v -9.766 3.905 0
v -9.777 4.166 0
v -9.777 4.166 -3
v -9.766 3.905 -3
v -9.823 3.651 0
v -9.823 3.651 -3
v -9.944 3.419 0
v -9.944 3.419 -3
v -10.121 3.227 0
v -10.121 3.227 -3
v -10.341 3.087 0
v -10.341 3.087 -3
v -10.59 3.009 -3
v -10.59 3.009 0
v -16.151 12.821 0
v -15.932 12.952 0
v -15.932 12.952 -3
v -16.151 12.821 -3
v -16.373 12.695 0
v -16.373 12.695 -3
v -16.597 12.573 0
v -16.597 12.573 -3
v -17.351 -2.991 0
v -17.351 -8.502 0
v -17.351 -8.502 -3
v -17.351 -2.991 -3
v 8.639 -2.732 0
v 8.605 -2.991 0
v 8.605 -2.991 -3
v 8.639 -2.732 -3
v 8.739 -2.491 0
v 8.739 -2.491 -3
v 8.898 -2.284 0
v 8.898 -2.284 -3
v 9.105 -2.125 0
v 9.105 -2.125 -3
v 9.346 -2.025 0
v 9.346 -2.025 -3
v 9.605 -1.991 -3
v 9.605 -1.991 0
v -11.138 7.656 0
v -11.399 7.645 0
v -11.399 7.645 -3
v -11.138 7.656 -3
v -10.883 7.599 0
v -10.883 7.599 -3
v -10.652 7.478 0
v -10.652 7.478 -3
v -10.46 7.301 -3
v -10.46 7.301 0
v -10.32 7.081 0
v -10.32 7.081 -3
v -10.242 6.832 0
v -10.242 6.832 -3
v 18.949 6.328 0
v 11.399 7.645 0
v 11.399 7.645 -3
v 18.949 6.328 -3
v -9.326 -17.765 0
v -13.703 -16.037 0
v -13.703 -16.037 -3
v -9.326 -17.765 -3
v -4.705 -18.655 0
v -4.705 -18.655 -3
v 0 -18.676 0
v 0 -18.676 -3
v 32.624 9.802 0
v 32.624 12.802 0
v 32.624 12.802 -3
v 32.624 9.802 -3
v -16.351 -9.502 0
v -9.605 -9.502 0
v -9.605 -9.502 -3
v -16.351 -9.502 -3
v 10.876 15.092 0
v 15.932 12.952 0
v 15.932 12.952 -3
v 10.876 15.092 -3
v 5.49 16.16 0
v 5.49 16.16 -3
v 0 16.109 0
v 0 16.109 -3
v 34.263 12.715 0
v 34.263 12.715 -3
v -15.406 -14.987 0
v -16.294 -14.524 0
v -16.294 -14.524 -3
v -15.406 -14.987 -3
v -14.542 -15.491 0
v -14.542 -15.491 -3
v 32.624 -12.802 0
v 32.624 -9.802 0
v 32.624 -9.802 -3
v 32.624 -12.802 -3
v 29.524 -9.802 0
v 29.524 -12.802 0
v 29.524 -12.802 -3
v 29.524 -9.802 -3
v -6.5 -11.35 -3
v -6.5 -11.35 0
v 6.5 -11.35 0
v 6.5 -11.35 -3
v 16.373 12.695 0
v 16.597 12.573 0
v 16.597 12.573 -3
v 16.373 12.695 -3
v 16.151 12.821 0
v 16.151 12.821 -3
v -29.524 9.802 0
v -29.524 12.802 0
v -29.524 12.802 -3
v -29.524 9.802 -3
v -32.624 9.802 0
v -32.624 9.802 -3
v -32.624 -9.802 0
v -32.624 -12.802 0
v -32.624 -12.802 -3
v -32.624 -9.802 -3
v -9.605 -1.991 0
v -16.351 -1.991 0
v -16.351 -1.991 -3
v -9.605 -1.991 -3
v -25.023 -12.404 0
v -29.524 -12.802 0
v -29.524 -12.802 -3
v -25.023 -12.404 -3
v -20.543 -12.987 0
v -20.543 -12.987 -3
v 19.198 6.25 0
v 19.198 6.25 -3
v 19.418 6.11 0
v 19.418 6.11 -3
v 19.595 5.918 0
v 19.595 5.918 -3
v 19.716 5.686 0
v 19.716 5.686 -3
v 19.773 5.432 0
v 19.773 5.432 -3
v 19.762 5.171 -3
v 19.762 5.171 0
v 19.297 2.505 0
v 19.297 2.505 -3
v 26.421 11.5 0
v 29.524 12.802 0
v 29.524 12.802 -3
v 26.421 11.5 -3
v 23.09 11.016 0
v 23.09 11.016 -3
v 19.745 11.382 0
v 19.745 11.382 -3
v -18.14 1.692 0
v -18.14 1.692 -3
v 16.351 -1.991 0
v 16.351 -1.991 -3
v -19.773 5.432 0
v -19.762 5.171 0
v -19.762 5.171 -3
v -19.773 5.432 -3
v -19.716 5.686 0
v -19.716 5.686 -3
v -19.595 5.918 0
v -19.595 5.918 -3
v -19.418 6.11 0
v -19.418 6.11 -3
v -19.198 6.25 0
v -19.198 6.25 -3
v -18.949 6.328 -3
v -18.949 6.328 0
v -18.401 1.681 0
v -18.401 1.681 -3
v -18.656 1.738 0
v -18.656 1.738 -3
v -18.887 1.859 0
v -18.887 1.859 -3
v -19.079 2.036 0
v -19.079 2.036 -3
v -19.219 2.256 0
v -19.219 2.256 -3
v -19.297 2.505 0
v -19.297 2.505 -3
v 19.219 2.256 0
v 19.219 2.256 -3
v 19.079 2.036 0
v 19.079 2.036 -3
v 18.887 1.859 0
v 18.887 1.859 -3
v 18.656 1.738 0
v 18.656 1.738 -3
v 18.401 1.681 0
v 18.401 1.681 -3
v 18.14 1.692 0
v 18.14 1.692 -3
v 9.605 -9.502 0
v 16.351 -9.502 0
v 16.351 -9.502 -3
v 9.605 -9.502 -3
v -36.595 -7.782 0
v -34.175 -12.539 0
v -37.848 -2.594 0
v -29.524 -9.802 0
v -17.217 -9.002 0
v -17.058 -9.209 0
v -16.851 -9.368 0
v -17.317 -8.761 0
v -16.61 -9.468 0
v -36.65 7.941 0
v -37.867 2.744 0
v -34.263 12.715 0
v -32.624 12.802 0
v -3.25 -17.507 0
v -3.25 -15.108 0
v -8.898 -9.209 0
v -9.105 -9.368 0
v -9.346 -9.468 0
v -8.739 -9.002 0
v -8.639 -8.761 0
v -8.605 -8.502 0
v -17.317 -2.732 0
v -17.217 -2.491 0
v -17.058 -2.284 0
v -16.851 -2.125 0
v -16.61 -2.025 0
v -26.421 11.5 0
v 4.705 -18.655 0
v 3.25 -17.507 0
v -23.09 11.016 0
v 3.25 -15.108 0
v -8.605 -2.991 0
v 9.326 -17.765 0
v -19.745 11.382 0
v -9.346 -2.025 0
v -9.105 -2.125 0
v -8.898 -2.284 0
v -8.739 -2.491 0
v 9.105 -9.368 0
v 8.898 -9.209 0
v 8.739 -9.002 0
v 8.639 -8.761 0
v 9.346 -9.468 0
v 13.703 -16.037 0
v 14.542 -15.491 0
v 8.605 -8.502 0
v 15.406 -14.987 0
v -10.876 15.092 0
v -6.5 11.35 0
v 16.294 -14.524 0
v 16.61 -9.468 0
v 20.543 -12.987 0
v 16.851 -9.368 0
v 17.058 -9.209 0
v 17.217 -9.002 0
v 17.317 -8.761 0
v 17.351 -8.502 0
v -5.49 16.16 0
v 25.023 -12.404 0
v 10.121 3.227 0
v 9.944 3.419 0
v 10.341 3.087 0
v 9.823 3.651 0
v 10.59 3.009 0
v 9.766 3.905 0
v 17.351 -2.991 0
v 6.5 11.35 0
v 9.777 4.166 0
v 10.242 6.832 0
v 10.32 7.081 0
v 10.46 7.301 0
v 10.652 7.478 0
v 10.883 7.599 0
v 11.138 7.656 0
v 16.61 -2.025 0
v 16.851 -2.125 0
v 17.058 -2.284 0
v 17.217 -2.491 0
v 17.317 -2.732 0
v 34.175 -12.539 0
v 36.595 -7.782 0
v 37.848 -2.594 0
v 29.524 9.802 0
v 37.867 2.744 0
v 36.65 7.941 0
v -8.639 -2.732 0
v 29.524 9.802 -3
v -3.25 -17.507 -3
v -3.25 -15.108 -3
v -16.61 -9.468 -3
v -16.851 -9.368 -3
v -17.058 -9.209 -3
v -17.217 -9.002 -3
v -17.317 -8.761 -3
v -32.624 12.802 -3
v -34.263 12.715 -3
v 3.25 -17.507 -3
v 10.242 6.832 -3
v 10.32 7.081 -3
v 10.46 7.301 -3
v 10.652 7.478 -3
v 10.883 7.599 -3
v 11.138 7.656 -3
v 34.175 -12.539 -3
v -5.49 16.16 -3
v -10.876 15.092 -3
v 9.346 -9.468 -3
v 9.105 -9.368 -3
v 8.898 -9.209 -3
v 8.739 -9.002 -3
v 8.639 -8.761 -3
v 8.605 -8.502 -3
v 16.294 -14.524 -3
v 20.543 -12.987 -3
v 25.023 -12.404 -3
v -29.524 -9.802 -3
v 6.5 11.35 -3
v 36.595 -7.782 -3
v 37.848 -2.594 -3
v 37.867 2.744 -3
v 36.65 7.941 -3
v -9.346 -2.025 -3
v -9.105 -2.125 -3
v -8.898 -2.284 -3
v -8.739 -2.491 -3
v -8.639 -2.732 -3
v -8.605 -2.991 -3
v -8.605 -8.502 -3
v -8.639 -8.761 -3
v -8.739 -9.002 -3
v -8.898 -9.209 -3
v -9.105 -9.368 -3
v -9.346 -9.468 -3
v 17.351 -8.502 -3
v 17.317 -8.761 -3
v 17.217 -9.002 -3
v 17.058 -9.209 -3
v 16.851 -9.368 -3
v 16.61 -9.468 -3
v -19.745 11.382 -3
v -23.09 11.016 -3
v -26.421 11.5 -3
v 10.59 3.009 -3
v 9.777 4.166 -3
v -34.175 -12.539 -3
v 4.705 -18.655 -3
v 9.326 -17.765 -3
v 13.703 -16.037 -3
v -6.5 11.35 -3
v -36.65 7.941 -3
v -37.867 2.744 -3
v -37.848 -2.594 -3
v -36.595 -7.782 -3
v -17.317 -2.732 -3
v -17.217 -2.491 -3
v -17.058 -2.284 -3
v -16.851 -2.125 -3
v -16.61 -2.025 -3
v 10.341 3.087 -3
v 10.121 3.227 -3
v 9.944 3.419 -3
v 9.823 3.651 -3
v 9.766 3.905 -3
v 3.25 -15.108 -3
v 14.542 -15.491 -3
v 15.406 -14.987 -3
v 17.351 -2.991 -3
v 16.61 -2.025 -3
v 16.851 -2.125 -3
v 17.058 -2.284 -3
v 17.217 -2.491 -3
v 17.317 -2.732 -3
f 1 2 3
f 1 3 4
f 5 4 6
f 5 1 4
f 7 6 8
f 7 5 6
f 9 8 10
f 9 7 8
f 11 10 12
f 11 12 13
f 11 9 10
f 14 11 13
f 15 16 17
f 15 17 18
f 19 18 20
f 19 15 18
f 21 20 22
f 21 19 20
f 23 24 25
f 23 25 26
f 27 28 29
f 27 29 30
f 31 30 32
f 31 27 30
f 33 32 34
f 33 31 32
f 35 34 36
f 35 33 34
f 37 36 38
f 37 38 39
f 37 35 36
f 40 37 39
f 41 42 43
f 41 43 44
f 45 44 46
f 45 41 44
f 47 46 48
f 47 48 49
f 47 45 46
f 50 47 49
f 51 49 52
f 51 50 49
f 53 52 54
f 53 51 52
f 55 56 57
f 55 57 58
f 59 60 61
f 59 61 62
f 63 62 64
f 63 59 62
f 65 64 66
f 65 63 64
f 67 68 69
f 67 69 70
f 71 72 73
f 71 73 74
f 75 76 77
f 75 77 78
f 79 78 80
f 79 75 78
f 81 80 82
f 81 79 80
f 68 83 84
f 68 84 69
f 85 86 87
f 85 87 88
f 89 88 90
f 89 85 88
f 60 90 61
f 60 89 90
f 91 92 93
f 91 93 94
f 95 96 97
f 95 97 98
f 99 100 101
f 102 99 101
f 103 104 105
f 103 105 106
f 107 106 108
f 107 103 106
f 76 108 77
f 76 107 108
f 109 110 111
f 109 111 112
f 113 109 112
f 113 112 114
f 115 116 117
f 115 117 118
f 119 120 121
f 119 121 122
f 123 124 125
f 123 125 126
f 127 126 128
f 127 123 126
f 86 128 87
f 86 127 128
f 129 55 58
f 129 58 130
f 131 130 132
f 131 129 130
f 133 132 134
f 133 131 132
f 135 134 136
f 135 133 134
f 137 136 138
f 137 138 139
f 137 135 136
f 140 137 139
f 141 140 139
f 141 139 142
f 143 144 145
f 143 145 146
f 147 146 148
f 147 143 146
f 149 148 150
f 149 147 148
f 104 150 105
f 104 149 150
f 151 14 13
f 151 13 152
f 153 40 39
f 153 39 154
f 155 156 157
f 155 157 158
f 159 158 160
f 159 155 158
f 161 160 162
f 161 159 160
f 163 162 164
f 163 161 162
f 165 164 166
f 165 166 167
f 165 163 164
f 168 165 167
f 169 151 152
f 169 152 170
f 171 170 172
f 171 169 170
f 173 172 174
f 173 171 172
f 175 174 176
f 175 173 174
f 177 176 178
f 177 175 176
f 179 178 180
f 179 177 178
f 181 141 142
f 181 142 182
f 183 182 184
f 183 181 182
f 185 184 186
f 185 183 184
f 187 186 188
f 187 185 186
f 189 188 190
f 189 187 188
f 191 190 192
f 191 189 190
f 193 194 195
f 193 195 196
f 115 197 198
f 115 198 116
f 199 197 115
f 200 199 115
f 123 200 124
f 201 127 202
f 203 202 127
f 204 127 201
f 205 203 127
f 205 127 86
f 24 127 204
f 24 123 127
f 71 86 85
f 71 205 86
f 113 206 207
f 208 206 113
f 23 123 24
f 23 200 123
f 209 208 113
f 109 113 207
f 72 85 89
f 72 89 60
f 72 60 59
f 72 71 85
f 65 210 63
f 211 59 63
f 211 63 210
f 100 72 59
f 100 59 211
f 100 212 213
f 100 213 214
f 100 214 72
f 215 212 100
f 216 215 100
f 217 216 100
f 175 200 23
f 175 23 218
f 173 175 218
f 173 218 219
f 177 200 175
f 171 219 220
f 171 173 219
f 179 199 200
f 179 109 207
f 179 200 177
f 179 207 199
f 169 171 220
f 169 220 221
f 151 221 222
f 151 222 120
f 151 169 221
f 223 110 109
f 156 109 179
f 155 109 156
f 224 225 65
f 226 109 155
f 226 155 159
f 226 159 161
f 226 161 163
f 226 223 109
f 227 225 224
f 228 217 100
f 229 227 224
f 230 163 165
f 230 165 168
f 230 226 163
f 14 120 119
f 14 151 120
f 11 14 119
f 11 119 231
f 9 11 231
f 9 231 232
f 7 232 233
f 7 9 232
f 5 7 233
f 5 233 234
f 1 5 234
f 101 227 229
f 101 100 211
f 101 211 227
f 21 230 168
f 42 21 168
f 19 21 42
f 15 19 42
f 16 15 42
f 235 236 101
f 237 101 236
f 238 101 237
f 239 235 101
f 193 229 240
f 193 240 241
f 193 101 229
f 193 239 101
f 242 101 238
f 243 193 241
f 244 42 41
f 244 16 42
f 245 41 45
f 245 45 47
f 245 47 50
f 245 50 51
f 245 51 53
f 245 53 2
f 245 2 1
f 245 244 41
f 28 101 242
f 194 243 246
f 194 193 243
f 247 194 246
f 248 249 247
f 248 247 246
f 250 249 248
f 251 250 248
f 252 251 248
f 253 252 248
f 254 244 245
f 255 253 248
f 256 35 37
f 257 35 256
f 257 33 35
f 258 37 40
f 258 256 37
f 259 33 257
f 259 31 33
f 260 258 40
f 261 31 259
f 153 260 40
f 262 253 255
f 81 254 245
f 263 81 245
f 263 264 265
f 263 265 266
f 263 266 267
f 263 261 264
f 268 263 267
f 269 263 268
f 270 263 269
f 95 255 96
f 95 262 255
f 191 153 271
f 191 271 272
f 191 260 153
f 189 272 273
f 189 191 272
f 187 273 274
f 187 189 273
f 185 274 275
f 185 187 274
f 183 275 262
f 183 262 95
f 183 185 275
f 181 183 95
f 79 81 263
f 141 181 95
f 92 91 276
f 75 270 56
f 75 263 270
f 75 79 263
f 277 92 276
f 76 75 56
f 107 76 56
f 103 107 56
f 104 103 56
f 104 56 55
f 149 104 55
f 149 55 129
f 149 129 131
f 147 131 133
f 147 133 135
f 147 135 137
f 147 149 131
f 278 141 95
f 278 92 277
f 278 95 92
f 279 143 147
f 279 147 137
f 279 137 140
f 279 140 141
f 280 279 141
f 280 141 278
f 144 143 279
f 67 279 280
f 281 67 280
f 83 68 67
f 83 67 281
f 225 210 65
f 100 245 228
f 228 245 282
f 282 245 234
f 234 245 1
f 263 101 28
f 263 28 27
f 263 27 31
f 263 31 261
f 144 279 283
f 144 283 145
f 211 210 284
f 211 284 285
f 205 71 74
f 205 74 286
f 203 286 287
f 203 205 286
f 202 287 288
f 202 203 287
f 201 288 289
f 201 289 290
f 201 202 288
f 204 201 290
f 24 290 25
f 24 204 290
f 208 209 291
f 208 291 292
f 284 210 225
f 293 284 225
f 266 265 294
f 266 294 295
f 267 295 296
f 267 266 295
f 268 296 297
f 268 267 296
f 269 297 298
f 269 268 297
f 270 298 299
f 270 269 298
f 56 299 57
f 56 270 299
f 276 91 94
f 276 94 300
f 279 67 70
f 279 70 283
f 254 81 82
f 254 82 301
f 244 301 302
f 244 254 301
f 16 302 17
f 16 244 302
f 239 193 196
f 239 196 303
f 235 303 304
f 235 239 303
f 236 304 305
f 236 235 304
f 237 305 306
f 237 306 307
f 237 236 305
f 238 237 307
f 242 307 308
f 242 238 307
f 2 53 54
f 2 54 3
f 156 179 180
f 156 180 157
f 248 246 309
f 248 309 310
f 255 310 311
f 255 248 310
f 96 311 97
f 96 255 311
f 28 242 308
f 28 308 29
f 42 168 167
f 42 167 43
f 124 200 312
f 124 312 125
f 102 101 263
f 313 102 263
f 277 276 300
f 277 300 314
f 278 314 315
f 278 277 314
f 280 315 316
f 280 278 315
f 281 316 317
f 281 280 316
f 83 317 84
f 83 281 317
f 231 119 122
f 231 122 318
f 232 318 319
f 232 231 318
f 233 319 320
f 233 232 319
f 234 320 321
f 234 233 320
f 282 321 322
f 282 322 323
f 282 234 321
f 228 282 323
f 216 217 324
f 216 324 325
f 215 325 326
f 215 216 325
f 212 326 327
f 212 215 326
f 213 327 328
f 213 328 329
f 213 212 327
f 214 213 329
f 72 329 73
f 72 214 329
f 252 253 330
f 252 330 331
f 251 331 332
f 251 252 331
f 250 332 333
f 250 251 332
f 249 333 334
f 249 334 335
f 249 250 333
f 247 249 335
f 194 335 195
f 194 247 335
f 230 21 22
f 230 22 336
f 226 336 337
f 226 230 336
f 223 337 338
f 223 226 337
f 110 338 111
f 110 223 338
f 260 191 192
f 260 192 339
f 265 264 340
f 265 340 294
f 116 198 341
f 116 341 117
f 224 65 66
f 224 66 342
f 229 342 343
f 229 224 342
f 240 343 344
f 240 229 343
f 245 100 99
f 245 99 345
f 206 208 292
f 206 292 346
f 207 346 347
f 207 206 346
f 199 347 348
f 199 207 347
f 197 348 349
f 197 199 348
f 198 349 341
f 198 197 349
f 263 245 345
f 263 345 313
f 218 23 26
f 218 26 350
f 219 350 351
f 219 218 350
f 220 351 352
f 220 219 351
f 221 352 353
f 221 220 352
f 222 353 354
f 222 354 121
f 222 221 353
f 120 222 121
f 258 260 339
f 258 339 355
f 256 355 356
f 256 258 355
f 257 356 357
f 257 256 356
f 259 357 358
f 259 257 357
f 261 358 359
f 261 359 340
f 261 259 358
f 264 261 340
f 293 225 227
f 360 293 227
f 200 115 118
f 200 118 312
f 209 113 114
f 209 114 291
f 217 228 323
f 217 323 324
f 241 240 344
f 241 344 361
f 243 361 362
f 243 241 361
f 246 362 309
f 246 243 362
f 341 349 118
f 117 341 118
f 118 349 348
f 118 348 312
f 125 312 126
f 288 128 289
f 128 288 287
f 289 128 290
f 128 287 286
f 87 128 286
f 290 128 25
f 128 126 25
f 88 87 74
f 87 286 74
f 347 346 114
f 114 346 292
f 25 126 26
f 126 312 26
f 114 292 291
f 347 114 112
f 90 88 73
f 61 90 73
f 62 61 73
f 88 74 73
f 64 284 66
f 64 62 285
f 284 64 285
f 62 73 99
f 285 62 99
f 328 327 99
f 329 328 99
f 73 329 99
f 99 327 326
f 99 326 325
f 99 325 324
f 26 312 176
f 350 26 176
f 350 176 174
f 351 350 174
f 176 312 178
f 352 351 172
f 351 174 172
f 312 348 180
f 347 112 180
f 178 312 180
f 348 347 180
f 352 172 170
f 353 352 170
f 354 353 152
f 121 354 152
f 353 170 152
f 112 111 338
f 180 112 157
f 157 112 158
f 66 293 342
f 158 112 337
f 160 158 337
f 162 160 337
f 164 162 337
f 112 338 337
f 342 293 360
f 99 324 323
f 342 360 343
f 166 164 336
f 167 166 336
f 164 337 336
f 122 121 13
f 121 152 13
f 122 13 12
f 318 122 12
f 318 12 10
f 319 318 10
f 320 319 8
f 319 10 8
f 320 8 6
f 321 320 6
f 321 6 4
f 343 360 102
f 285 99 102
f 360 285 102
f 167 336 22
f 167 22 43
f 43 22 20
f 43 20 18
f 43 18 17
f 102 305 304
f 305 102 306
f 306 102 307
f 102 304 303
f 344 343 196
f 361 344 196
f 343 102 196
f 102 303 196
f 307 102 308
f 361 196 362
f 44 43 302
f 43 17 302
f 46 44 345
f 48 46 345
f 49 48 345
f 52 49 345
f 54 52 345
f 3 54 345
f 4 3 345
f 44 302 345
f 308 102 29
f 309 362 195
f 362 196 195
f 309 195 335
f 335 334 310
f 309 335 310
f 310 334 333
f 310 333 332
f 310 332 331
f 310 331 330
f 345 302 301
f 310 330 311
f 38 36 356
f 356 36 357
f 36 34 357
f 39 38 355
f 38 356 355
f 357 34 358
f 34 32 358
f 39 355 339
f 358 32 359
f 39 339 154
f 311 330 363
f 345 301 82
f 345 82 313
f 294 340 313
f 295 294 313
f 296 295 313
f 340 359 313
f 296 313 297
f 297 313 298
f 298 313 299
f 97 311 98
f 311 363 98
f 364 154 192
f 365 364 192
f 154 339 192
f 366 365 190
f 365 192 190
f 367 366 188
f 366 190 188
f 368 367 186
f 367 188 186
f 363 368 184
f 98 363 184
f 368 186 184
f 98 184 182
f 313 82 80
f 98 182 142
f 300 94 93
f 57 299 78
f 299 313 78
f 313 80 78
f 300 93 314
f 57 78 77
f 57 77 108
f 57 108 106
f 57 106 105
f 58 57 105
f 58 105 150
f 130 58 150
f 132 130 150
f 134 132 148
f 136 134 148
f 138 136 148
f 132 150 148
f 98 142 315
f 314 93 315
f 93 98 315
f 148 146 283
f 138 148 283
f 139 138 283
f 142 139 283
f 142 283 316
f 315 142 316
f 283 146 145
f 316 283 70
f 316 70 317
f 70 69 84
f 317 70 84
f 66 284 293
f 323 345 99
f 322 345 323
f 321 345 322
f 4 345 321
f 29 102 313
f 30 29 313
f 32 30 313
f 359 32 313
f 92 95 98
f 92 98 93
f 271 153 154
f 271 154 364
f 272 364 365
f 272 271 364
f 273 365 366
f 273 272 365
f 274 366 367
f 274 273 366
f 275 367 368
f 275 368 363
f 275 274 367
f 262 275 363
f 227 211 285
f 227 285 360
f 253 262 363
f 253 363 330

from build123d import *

# Parameters (mm, degrees)
BOSS_EXTRUDE1_DEPTH = 3
SKETCH2_W           = 13
SKETCH2_H           = 22.7
SKETCH2_W_2         = 6.499
SKETCH2_H_2         = 2.399
CUT_EXTRUDE1_DEPTH  = 3


with BuildPart() as part:
    # Sketch1 → Boss-Extrude1 (new body)
    with BuildSketch(Plane.XY):
        with BuildLine():
            ThreePointArc((-27.048045715, 1.346978667), (-23.229413898, -7.644456097), (-16.294351646, -14.524336884))
            ThreePointArc((-16.294351646, -14.524336884), (-14.971129192, -15.233831637), (-13.702557421, -16.036966825))
            ThreePointArc((-13.702557421, -16.036966825), (-7.036411487, -18.317683791), (0, -18.675573281))
            ThreePointArc((0, -18.675573281), (7.036411487, -18.317683791), (13.702557421, -16.036966825))
            ThreePointArc((13.702557421, -16.036966825), (14.971129192, -15.233831637), (16.294351646, -14.524336884))
            ThreePointArc((16.294351646, -14.524336884), (23.229413898, -7.644456097), (27.048045715, 1.346978667))
            ThreePointArc((27.048045715, 1.346978667), (22.641390956, 7.722324922), (16.597159635, 12.573192245))
            ThreePointArc((16.597159635, 12.573192245), (16.261784348, 12.757647773), (15.931841919, 12.951654004))
            ThreePointArc((15.931841919, 12.951654004), (8.210400332, 15.763932748), (0, 16.108749071))
            ThreePointArc((0, 16.108749071), (-8.210400332, 15.763932748), (-15.931841919, 12.951654004))
            ThreePointArc((-15.931841919, 12.951654004), (-16.261784348, 12.757647773), (-16.597159635, 12.573192245))
            ThreePointArc((-16.597159635, 12.573192245), (-22.641390956, 7.722324922), (-27.048045715, 1.346978667))
        make_face()
        with BuildLine():
            Line((29.524, 9.802), (29.524, -9.802))
            Line((29.524, -9.802), (32.624, -9.802))
            Line((32.624, -9.802), (32.624, -12.802))
            Line((32.624, -12.802), (34.17489845, -12.539239659))
            ThreePointArc((34.17489845, -12.539239659), (38.013587392, 0.074463168), (34.262667869, 12.714543648))
            Line((34.262667869, 12.714543648), (32.624, 12.802))
            Line((32.624, 12.802), (32.624, 9.802))
            Line((32.624, 9.802), (29.524, 9.802))
        make_face()
        with BuildLine():
            ThreePointArc((27.048045715, 1.346978667), (23.229413898, -7.644456097), (16.294351646, -14.524336884))
            ThreePointArc((16.294351646, -14.524336884), (22.767282146, -12.573251909), (29.524, -12.802))
            Line((29.524, -12.802), (29.524, -9.802))
            Line((29.524, -9.802), (29.524, 9.802))
            Line((29.524, 9.802), (29.524, 12.802))
            ThreePointArc((29.524, 12.802), (23.09016911, 11.015904248), (16.597159635, 12.573192245))
            ThreePointArc((16.597159635, 12.573192245), (22.641390956, 7.722324922), (27.048045715, 1.346978667))
        make_face()
        with BuildLine():
            Line((-29.524, -9.802), (-29.524, -12.802))
            ThreePointArc((-29.524, -12.802), (-22.767282146, -12.573251909), (-16.294351646, -14.524336884))
            ThreePointArc((-16.294351646, -14.524336884), (-23.229413898, -7.644456097), (-27.048045715, 1.346978667))
            ThreePointArc((-27.048045715, 1.346978667), (-22.641390956, 7.722324922), (-16.597159635, 12.573192245))
            ThreePointArc((-16.597159635, 12.573192245), (-23.09016911, 11.015904248), (-29.524, 12.802))
            Line((-29.524, 12.802), (-29.524, 9.802))
            Line((-29.524, 9.802), (-29.524, -9.802))
        make_face()
        with BuildLine():
            Line((-32.624, -9.802), (-29.524, -9.802))
            Line((-29.524, -9.802), (-29.524, 9.802))
            Line((-29.524, 9.802), (-32.624, 9.802))
            Line((-32.624, 9.802), (-32.624, 12.802))
            Line((-32.624, 12.802), (-34.262667869, 12.714543648))
            ThreePointArc((-34.262667869, 12.714543648), (-38.013587392, 0.074463168), (-34.17489845, -12.539239659))
            Line((-34.17489845, -12.539239659), (-32.624, -12.802))
            Line((-32.624, -12.802), (-32.624, -9.802))
        make_face()
    extrude(amount=-BOSS_EXTRUDE1_DEPTH)

    # Sketch2 → Cut-Extrude1 (cut)
    with BuildSketch(Plane.XY):
        with BuildLine():
            ThreePointArc((-18.140073475, 1.691900685), (-18.886998155, 1.858903562), (-19.297064795, 2.505147934))
            Line((-19.297064795, 2.505147934), (-19.762150522, 5.170880716))
            ThreePointArc((-19.762150522, 5.170880716), (-19.595147646, 5.917805396), (-18.948903274, 6.327872035))
            Line((-18.948903274, 6.327872035), (-11.398949082, 7.645099315))
            ThreePointArc((-11.398949082, 7.645099315), (-10.652024403, 7.478096438), (-10.241957763, 6.831852066))
            Line((-10.241957763, 6.831852066), (-9.776872035, 4.166119284))
            ThreePointArc((-9.776872035, 4.166119284), (-9.943874912, 3.419194604), (-10.590119284, 3.009127965))
            Line((-10.590119284, 3.009127965), (-18.140073475, 1.691900685))
        make_face()
        Rectangle(SKETCH2_W, SKETCH2_H)
        with BuildLine():
            ThreePointArc((-16.351, -9.502), (-17.058106781, -9.209106781), (-17.351, -8.502))
            Line((-17.351, -8.502), (-17.351, -2.991))
            ThreePointArc((-17.351, -2.991), (-17.058106781, -2.283893219), (-16.351, -1.991))
            Line((-16.351, -1.991), (-9.605, -1.991))
            ThreePointArc((-9.605, -1.991), (-8.897893219, -2.283893219), (-8.605, -2.991))
            Line((-8.605, -2.991), (-8.605, -8.502))
            ThreePointArc((-8.605, -8.502), (-8.897893219, -9.209106781), (-9.605, -9.502))
            Line((-9.605, -9.502), (-16.351, -9.502))
        make_face()
        with BuildLine():
            Line((9.605, -1.991), (16.351, -1.991))
            ThreePointArc((16.351, -1.991), (17.058106781, -2.283893219), (17.351, -2.991))
            Line((17.351, -2.991), (17.351, -8.502))
            ThreePointArc((17.351, -8.502), (17.058106781, -9.209106781), (16.351, -9.502))
            Line((16.351, -9.502), (9.605, -9.502))
            ThreePointArc((9.605, -9.502), (8.897893219, -9.209106781), (8.605, -8.502))
            Line((8.605, -8.502), (8.605, -2.991))
            ThreePointArc((8.605, -2.991), (8.897893219, -2.283893219), (9.605, -1.991))
        make_face()
        with BuildLine():
            ThreePointArc((10.241957763, 6.831852066), (10.652024403, 7.478096438), (11.398949082, 7.645099315))
            Line((11.398949082, 7.645099315), (18.948903274, 6.327872035))
            ThreePointArc((18.948903274, 6.327872035), (19.595147646, 5.917805396), (19.762150522, 5.170880716))
            Line((19.762150522, 5.170880716), (19.297064795, 2.505147934))
            ThreePointArc((19.297064795, 2.505147934), (18.886998155, 1.858903562), (18.140073475, 1.691900685))
            Line((18.140073475, 1.691900685), (10.590119284, 3.009127965))
            ThreePointArc((10.590119284, 3.009127965), (9.943874912, 3.419194604), (9.776872035, 4.166119284))
            Line((9.776872035, 4.166119284), (10.241957763, 6.831852066))
        make_face()
        with Locations((0, -16.3075)):
            Rectangle(SKETCH2_W_2, SKETCH2_H_2)
    extrude(amount=-CUT_EXTRUDE1_DEPTH, mode=Mode.SUBTRACT)


solid = part.part
